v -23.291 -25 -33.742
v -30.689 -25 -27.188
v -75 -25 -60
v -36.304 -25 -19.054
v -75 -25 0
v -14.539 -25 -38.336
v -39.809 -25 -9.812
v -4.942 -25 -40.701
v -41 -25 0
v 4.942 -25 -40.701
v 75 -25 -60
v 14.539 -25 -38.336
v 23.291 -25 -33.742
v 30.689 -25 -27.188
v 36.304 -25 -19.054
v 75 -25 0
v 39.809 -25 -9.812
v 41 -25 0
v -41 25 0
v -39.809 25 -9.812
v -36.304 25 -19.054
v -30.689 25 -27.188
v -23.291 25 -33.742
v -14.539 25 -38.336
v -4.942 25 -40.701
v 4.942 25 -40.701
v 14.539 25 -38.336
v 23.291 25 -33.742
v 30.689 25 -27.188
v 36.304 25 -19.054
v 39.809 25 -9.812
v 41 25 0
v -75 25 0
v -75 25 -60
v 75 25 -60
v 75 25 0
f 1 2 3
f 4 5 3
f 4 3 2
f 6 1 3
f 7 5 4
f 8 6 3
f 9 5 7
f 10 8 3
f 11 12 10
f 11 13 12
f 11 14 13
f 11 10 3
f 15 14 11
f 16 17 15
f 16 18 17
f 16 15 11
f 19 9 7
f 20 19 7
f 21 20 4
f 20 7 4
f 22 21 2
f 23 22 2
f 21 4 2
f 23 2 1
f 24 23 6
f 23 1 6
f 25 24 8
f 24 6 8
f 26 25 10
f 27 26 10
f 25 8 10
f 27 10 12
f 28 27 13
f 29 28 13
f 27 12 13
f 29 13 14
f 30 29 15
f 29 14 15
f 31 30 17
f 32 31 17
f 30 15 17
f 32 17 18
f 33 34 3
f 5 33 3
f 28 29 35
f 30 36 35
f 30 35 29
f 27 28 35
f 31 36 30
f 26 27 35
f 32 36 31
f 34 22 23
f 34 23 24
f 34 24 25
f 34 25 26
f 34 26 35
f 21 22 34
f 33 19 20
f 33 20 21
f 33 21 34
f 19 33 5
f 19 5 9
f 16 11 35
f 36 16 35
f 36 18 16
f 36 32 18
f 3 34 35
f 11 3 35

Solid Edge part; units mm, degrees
sketch "Sketch1" plane through (0, 0, 0) normal (0, 0, 1) x (1, 0, 0)
  line L0 (-75, -25) -> (75, -25)
  line L1 (75, -25) -> (75, 25)
  line L2 (75, 25) -> (-75, 25)
  line L3 (-75, 25) -> (-75, -25)
extrude "Protrusion1" add sketch "Sketch1" against normal blind 60
sketch "Sketch2" plane through (0, -25, -30) normal (0, -1, 0) x (1, 0, 0)
  circle A0 centre (0, 30) radius 41
extrude "ExtrudedCutout_1" cut sketch "Sketch2" against normal blind 50
